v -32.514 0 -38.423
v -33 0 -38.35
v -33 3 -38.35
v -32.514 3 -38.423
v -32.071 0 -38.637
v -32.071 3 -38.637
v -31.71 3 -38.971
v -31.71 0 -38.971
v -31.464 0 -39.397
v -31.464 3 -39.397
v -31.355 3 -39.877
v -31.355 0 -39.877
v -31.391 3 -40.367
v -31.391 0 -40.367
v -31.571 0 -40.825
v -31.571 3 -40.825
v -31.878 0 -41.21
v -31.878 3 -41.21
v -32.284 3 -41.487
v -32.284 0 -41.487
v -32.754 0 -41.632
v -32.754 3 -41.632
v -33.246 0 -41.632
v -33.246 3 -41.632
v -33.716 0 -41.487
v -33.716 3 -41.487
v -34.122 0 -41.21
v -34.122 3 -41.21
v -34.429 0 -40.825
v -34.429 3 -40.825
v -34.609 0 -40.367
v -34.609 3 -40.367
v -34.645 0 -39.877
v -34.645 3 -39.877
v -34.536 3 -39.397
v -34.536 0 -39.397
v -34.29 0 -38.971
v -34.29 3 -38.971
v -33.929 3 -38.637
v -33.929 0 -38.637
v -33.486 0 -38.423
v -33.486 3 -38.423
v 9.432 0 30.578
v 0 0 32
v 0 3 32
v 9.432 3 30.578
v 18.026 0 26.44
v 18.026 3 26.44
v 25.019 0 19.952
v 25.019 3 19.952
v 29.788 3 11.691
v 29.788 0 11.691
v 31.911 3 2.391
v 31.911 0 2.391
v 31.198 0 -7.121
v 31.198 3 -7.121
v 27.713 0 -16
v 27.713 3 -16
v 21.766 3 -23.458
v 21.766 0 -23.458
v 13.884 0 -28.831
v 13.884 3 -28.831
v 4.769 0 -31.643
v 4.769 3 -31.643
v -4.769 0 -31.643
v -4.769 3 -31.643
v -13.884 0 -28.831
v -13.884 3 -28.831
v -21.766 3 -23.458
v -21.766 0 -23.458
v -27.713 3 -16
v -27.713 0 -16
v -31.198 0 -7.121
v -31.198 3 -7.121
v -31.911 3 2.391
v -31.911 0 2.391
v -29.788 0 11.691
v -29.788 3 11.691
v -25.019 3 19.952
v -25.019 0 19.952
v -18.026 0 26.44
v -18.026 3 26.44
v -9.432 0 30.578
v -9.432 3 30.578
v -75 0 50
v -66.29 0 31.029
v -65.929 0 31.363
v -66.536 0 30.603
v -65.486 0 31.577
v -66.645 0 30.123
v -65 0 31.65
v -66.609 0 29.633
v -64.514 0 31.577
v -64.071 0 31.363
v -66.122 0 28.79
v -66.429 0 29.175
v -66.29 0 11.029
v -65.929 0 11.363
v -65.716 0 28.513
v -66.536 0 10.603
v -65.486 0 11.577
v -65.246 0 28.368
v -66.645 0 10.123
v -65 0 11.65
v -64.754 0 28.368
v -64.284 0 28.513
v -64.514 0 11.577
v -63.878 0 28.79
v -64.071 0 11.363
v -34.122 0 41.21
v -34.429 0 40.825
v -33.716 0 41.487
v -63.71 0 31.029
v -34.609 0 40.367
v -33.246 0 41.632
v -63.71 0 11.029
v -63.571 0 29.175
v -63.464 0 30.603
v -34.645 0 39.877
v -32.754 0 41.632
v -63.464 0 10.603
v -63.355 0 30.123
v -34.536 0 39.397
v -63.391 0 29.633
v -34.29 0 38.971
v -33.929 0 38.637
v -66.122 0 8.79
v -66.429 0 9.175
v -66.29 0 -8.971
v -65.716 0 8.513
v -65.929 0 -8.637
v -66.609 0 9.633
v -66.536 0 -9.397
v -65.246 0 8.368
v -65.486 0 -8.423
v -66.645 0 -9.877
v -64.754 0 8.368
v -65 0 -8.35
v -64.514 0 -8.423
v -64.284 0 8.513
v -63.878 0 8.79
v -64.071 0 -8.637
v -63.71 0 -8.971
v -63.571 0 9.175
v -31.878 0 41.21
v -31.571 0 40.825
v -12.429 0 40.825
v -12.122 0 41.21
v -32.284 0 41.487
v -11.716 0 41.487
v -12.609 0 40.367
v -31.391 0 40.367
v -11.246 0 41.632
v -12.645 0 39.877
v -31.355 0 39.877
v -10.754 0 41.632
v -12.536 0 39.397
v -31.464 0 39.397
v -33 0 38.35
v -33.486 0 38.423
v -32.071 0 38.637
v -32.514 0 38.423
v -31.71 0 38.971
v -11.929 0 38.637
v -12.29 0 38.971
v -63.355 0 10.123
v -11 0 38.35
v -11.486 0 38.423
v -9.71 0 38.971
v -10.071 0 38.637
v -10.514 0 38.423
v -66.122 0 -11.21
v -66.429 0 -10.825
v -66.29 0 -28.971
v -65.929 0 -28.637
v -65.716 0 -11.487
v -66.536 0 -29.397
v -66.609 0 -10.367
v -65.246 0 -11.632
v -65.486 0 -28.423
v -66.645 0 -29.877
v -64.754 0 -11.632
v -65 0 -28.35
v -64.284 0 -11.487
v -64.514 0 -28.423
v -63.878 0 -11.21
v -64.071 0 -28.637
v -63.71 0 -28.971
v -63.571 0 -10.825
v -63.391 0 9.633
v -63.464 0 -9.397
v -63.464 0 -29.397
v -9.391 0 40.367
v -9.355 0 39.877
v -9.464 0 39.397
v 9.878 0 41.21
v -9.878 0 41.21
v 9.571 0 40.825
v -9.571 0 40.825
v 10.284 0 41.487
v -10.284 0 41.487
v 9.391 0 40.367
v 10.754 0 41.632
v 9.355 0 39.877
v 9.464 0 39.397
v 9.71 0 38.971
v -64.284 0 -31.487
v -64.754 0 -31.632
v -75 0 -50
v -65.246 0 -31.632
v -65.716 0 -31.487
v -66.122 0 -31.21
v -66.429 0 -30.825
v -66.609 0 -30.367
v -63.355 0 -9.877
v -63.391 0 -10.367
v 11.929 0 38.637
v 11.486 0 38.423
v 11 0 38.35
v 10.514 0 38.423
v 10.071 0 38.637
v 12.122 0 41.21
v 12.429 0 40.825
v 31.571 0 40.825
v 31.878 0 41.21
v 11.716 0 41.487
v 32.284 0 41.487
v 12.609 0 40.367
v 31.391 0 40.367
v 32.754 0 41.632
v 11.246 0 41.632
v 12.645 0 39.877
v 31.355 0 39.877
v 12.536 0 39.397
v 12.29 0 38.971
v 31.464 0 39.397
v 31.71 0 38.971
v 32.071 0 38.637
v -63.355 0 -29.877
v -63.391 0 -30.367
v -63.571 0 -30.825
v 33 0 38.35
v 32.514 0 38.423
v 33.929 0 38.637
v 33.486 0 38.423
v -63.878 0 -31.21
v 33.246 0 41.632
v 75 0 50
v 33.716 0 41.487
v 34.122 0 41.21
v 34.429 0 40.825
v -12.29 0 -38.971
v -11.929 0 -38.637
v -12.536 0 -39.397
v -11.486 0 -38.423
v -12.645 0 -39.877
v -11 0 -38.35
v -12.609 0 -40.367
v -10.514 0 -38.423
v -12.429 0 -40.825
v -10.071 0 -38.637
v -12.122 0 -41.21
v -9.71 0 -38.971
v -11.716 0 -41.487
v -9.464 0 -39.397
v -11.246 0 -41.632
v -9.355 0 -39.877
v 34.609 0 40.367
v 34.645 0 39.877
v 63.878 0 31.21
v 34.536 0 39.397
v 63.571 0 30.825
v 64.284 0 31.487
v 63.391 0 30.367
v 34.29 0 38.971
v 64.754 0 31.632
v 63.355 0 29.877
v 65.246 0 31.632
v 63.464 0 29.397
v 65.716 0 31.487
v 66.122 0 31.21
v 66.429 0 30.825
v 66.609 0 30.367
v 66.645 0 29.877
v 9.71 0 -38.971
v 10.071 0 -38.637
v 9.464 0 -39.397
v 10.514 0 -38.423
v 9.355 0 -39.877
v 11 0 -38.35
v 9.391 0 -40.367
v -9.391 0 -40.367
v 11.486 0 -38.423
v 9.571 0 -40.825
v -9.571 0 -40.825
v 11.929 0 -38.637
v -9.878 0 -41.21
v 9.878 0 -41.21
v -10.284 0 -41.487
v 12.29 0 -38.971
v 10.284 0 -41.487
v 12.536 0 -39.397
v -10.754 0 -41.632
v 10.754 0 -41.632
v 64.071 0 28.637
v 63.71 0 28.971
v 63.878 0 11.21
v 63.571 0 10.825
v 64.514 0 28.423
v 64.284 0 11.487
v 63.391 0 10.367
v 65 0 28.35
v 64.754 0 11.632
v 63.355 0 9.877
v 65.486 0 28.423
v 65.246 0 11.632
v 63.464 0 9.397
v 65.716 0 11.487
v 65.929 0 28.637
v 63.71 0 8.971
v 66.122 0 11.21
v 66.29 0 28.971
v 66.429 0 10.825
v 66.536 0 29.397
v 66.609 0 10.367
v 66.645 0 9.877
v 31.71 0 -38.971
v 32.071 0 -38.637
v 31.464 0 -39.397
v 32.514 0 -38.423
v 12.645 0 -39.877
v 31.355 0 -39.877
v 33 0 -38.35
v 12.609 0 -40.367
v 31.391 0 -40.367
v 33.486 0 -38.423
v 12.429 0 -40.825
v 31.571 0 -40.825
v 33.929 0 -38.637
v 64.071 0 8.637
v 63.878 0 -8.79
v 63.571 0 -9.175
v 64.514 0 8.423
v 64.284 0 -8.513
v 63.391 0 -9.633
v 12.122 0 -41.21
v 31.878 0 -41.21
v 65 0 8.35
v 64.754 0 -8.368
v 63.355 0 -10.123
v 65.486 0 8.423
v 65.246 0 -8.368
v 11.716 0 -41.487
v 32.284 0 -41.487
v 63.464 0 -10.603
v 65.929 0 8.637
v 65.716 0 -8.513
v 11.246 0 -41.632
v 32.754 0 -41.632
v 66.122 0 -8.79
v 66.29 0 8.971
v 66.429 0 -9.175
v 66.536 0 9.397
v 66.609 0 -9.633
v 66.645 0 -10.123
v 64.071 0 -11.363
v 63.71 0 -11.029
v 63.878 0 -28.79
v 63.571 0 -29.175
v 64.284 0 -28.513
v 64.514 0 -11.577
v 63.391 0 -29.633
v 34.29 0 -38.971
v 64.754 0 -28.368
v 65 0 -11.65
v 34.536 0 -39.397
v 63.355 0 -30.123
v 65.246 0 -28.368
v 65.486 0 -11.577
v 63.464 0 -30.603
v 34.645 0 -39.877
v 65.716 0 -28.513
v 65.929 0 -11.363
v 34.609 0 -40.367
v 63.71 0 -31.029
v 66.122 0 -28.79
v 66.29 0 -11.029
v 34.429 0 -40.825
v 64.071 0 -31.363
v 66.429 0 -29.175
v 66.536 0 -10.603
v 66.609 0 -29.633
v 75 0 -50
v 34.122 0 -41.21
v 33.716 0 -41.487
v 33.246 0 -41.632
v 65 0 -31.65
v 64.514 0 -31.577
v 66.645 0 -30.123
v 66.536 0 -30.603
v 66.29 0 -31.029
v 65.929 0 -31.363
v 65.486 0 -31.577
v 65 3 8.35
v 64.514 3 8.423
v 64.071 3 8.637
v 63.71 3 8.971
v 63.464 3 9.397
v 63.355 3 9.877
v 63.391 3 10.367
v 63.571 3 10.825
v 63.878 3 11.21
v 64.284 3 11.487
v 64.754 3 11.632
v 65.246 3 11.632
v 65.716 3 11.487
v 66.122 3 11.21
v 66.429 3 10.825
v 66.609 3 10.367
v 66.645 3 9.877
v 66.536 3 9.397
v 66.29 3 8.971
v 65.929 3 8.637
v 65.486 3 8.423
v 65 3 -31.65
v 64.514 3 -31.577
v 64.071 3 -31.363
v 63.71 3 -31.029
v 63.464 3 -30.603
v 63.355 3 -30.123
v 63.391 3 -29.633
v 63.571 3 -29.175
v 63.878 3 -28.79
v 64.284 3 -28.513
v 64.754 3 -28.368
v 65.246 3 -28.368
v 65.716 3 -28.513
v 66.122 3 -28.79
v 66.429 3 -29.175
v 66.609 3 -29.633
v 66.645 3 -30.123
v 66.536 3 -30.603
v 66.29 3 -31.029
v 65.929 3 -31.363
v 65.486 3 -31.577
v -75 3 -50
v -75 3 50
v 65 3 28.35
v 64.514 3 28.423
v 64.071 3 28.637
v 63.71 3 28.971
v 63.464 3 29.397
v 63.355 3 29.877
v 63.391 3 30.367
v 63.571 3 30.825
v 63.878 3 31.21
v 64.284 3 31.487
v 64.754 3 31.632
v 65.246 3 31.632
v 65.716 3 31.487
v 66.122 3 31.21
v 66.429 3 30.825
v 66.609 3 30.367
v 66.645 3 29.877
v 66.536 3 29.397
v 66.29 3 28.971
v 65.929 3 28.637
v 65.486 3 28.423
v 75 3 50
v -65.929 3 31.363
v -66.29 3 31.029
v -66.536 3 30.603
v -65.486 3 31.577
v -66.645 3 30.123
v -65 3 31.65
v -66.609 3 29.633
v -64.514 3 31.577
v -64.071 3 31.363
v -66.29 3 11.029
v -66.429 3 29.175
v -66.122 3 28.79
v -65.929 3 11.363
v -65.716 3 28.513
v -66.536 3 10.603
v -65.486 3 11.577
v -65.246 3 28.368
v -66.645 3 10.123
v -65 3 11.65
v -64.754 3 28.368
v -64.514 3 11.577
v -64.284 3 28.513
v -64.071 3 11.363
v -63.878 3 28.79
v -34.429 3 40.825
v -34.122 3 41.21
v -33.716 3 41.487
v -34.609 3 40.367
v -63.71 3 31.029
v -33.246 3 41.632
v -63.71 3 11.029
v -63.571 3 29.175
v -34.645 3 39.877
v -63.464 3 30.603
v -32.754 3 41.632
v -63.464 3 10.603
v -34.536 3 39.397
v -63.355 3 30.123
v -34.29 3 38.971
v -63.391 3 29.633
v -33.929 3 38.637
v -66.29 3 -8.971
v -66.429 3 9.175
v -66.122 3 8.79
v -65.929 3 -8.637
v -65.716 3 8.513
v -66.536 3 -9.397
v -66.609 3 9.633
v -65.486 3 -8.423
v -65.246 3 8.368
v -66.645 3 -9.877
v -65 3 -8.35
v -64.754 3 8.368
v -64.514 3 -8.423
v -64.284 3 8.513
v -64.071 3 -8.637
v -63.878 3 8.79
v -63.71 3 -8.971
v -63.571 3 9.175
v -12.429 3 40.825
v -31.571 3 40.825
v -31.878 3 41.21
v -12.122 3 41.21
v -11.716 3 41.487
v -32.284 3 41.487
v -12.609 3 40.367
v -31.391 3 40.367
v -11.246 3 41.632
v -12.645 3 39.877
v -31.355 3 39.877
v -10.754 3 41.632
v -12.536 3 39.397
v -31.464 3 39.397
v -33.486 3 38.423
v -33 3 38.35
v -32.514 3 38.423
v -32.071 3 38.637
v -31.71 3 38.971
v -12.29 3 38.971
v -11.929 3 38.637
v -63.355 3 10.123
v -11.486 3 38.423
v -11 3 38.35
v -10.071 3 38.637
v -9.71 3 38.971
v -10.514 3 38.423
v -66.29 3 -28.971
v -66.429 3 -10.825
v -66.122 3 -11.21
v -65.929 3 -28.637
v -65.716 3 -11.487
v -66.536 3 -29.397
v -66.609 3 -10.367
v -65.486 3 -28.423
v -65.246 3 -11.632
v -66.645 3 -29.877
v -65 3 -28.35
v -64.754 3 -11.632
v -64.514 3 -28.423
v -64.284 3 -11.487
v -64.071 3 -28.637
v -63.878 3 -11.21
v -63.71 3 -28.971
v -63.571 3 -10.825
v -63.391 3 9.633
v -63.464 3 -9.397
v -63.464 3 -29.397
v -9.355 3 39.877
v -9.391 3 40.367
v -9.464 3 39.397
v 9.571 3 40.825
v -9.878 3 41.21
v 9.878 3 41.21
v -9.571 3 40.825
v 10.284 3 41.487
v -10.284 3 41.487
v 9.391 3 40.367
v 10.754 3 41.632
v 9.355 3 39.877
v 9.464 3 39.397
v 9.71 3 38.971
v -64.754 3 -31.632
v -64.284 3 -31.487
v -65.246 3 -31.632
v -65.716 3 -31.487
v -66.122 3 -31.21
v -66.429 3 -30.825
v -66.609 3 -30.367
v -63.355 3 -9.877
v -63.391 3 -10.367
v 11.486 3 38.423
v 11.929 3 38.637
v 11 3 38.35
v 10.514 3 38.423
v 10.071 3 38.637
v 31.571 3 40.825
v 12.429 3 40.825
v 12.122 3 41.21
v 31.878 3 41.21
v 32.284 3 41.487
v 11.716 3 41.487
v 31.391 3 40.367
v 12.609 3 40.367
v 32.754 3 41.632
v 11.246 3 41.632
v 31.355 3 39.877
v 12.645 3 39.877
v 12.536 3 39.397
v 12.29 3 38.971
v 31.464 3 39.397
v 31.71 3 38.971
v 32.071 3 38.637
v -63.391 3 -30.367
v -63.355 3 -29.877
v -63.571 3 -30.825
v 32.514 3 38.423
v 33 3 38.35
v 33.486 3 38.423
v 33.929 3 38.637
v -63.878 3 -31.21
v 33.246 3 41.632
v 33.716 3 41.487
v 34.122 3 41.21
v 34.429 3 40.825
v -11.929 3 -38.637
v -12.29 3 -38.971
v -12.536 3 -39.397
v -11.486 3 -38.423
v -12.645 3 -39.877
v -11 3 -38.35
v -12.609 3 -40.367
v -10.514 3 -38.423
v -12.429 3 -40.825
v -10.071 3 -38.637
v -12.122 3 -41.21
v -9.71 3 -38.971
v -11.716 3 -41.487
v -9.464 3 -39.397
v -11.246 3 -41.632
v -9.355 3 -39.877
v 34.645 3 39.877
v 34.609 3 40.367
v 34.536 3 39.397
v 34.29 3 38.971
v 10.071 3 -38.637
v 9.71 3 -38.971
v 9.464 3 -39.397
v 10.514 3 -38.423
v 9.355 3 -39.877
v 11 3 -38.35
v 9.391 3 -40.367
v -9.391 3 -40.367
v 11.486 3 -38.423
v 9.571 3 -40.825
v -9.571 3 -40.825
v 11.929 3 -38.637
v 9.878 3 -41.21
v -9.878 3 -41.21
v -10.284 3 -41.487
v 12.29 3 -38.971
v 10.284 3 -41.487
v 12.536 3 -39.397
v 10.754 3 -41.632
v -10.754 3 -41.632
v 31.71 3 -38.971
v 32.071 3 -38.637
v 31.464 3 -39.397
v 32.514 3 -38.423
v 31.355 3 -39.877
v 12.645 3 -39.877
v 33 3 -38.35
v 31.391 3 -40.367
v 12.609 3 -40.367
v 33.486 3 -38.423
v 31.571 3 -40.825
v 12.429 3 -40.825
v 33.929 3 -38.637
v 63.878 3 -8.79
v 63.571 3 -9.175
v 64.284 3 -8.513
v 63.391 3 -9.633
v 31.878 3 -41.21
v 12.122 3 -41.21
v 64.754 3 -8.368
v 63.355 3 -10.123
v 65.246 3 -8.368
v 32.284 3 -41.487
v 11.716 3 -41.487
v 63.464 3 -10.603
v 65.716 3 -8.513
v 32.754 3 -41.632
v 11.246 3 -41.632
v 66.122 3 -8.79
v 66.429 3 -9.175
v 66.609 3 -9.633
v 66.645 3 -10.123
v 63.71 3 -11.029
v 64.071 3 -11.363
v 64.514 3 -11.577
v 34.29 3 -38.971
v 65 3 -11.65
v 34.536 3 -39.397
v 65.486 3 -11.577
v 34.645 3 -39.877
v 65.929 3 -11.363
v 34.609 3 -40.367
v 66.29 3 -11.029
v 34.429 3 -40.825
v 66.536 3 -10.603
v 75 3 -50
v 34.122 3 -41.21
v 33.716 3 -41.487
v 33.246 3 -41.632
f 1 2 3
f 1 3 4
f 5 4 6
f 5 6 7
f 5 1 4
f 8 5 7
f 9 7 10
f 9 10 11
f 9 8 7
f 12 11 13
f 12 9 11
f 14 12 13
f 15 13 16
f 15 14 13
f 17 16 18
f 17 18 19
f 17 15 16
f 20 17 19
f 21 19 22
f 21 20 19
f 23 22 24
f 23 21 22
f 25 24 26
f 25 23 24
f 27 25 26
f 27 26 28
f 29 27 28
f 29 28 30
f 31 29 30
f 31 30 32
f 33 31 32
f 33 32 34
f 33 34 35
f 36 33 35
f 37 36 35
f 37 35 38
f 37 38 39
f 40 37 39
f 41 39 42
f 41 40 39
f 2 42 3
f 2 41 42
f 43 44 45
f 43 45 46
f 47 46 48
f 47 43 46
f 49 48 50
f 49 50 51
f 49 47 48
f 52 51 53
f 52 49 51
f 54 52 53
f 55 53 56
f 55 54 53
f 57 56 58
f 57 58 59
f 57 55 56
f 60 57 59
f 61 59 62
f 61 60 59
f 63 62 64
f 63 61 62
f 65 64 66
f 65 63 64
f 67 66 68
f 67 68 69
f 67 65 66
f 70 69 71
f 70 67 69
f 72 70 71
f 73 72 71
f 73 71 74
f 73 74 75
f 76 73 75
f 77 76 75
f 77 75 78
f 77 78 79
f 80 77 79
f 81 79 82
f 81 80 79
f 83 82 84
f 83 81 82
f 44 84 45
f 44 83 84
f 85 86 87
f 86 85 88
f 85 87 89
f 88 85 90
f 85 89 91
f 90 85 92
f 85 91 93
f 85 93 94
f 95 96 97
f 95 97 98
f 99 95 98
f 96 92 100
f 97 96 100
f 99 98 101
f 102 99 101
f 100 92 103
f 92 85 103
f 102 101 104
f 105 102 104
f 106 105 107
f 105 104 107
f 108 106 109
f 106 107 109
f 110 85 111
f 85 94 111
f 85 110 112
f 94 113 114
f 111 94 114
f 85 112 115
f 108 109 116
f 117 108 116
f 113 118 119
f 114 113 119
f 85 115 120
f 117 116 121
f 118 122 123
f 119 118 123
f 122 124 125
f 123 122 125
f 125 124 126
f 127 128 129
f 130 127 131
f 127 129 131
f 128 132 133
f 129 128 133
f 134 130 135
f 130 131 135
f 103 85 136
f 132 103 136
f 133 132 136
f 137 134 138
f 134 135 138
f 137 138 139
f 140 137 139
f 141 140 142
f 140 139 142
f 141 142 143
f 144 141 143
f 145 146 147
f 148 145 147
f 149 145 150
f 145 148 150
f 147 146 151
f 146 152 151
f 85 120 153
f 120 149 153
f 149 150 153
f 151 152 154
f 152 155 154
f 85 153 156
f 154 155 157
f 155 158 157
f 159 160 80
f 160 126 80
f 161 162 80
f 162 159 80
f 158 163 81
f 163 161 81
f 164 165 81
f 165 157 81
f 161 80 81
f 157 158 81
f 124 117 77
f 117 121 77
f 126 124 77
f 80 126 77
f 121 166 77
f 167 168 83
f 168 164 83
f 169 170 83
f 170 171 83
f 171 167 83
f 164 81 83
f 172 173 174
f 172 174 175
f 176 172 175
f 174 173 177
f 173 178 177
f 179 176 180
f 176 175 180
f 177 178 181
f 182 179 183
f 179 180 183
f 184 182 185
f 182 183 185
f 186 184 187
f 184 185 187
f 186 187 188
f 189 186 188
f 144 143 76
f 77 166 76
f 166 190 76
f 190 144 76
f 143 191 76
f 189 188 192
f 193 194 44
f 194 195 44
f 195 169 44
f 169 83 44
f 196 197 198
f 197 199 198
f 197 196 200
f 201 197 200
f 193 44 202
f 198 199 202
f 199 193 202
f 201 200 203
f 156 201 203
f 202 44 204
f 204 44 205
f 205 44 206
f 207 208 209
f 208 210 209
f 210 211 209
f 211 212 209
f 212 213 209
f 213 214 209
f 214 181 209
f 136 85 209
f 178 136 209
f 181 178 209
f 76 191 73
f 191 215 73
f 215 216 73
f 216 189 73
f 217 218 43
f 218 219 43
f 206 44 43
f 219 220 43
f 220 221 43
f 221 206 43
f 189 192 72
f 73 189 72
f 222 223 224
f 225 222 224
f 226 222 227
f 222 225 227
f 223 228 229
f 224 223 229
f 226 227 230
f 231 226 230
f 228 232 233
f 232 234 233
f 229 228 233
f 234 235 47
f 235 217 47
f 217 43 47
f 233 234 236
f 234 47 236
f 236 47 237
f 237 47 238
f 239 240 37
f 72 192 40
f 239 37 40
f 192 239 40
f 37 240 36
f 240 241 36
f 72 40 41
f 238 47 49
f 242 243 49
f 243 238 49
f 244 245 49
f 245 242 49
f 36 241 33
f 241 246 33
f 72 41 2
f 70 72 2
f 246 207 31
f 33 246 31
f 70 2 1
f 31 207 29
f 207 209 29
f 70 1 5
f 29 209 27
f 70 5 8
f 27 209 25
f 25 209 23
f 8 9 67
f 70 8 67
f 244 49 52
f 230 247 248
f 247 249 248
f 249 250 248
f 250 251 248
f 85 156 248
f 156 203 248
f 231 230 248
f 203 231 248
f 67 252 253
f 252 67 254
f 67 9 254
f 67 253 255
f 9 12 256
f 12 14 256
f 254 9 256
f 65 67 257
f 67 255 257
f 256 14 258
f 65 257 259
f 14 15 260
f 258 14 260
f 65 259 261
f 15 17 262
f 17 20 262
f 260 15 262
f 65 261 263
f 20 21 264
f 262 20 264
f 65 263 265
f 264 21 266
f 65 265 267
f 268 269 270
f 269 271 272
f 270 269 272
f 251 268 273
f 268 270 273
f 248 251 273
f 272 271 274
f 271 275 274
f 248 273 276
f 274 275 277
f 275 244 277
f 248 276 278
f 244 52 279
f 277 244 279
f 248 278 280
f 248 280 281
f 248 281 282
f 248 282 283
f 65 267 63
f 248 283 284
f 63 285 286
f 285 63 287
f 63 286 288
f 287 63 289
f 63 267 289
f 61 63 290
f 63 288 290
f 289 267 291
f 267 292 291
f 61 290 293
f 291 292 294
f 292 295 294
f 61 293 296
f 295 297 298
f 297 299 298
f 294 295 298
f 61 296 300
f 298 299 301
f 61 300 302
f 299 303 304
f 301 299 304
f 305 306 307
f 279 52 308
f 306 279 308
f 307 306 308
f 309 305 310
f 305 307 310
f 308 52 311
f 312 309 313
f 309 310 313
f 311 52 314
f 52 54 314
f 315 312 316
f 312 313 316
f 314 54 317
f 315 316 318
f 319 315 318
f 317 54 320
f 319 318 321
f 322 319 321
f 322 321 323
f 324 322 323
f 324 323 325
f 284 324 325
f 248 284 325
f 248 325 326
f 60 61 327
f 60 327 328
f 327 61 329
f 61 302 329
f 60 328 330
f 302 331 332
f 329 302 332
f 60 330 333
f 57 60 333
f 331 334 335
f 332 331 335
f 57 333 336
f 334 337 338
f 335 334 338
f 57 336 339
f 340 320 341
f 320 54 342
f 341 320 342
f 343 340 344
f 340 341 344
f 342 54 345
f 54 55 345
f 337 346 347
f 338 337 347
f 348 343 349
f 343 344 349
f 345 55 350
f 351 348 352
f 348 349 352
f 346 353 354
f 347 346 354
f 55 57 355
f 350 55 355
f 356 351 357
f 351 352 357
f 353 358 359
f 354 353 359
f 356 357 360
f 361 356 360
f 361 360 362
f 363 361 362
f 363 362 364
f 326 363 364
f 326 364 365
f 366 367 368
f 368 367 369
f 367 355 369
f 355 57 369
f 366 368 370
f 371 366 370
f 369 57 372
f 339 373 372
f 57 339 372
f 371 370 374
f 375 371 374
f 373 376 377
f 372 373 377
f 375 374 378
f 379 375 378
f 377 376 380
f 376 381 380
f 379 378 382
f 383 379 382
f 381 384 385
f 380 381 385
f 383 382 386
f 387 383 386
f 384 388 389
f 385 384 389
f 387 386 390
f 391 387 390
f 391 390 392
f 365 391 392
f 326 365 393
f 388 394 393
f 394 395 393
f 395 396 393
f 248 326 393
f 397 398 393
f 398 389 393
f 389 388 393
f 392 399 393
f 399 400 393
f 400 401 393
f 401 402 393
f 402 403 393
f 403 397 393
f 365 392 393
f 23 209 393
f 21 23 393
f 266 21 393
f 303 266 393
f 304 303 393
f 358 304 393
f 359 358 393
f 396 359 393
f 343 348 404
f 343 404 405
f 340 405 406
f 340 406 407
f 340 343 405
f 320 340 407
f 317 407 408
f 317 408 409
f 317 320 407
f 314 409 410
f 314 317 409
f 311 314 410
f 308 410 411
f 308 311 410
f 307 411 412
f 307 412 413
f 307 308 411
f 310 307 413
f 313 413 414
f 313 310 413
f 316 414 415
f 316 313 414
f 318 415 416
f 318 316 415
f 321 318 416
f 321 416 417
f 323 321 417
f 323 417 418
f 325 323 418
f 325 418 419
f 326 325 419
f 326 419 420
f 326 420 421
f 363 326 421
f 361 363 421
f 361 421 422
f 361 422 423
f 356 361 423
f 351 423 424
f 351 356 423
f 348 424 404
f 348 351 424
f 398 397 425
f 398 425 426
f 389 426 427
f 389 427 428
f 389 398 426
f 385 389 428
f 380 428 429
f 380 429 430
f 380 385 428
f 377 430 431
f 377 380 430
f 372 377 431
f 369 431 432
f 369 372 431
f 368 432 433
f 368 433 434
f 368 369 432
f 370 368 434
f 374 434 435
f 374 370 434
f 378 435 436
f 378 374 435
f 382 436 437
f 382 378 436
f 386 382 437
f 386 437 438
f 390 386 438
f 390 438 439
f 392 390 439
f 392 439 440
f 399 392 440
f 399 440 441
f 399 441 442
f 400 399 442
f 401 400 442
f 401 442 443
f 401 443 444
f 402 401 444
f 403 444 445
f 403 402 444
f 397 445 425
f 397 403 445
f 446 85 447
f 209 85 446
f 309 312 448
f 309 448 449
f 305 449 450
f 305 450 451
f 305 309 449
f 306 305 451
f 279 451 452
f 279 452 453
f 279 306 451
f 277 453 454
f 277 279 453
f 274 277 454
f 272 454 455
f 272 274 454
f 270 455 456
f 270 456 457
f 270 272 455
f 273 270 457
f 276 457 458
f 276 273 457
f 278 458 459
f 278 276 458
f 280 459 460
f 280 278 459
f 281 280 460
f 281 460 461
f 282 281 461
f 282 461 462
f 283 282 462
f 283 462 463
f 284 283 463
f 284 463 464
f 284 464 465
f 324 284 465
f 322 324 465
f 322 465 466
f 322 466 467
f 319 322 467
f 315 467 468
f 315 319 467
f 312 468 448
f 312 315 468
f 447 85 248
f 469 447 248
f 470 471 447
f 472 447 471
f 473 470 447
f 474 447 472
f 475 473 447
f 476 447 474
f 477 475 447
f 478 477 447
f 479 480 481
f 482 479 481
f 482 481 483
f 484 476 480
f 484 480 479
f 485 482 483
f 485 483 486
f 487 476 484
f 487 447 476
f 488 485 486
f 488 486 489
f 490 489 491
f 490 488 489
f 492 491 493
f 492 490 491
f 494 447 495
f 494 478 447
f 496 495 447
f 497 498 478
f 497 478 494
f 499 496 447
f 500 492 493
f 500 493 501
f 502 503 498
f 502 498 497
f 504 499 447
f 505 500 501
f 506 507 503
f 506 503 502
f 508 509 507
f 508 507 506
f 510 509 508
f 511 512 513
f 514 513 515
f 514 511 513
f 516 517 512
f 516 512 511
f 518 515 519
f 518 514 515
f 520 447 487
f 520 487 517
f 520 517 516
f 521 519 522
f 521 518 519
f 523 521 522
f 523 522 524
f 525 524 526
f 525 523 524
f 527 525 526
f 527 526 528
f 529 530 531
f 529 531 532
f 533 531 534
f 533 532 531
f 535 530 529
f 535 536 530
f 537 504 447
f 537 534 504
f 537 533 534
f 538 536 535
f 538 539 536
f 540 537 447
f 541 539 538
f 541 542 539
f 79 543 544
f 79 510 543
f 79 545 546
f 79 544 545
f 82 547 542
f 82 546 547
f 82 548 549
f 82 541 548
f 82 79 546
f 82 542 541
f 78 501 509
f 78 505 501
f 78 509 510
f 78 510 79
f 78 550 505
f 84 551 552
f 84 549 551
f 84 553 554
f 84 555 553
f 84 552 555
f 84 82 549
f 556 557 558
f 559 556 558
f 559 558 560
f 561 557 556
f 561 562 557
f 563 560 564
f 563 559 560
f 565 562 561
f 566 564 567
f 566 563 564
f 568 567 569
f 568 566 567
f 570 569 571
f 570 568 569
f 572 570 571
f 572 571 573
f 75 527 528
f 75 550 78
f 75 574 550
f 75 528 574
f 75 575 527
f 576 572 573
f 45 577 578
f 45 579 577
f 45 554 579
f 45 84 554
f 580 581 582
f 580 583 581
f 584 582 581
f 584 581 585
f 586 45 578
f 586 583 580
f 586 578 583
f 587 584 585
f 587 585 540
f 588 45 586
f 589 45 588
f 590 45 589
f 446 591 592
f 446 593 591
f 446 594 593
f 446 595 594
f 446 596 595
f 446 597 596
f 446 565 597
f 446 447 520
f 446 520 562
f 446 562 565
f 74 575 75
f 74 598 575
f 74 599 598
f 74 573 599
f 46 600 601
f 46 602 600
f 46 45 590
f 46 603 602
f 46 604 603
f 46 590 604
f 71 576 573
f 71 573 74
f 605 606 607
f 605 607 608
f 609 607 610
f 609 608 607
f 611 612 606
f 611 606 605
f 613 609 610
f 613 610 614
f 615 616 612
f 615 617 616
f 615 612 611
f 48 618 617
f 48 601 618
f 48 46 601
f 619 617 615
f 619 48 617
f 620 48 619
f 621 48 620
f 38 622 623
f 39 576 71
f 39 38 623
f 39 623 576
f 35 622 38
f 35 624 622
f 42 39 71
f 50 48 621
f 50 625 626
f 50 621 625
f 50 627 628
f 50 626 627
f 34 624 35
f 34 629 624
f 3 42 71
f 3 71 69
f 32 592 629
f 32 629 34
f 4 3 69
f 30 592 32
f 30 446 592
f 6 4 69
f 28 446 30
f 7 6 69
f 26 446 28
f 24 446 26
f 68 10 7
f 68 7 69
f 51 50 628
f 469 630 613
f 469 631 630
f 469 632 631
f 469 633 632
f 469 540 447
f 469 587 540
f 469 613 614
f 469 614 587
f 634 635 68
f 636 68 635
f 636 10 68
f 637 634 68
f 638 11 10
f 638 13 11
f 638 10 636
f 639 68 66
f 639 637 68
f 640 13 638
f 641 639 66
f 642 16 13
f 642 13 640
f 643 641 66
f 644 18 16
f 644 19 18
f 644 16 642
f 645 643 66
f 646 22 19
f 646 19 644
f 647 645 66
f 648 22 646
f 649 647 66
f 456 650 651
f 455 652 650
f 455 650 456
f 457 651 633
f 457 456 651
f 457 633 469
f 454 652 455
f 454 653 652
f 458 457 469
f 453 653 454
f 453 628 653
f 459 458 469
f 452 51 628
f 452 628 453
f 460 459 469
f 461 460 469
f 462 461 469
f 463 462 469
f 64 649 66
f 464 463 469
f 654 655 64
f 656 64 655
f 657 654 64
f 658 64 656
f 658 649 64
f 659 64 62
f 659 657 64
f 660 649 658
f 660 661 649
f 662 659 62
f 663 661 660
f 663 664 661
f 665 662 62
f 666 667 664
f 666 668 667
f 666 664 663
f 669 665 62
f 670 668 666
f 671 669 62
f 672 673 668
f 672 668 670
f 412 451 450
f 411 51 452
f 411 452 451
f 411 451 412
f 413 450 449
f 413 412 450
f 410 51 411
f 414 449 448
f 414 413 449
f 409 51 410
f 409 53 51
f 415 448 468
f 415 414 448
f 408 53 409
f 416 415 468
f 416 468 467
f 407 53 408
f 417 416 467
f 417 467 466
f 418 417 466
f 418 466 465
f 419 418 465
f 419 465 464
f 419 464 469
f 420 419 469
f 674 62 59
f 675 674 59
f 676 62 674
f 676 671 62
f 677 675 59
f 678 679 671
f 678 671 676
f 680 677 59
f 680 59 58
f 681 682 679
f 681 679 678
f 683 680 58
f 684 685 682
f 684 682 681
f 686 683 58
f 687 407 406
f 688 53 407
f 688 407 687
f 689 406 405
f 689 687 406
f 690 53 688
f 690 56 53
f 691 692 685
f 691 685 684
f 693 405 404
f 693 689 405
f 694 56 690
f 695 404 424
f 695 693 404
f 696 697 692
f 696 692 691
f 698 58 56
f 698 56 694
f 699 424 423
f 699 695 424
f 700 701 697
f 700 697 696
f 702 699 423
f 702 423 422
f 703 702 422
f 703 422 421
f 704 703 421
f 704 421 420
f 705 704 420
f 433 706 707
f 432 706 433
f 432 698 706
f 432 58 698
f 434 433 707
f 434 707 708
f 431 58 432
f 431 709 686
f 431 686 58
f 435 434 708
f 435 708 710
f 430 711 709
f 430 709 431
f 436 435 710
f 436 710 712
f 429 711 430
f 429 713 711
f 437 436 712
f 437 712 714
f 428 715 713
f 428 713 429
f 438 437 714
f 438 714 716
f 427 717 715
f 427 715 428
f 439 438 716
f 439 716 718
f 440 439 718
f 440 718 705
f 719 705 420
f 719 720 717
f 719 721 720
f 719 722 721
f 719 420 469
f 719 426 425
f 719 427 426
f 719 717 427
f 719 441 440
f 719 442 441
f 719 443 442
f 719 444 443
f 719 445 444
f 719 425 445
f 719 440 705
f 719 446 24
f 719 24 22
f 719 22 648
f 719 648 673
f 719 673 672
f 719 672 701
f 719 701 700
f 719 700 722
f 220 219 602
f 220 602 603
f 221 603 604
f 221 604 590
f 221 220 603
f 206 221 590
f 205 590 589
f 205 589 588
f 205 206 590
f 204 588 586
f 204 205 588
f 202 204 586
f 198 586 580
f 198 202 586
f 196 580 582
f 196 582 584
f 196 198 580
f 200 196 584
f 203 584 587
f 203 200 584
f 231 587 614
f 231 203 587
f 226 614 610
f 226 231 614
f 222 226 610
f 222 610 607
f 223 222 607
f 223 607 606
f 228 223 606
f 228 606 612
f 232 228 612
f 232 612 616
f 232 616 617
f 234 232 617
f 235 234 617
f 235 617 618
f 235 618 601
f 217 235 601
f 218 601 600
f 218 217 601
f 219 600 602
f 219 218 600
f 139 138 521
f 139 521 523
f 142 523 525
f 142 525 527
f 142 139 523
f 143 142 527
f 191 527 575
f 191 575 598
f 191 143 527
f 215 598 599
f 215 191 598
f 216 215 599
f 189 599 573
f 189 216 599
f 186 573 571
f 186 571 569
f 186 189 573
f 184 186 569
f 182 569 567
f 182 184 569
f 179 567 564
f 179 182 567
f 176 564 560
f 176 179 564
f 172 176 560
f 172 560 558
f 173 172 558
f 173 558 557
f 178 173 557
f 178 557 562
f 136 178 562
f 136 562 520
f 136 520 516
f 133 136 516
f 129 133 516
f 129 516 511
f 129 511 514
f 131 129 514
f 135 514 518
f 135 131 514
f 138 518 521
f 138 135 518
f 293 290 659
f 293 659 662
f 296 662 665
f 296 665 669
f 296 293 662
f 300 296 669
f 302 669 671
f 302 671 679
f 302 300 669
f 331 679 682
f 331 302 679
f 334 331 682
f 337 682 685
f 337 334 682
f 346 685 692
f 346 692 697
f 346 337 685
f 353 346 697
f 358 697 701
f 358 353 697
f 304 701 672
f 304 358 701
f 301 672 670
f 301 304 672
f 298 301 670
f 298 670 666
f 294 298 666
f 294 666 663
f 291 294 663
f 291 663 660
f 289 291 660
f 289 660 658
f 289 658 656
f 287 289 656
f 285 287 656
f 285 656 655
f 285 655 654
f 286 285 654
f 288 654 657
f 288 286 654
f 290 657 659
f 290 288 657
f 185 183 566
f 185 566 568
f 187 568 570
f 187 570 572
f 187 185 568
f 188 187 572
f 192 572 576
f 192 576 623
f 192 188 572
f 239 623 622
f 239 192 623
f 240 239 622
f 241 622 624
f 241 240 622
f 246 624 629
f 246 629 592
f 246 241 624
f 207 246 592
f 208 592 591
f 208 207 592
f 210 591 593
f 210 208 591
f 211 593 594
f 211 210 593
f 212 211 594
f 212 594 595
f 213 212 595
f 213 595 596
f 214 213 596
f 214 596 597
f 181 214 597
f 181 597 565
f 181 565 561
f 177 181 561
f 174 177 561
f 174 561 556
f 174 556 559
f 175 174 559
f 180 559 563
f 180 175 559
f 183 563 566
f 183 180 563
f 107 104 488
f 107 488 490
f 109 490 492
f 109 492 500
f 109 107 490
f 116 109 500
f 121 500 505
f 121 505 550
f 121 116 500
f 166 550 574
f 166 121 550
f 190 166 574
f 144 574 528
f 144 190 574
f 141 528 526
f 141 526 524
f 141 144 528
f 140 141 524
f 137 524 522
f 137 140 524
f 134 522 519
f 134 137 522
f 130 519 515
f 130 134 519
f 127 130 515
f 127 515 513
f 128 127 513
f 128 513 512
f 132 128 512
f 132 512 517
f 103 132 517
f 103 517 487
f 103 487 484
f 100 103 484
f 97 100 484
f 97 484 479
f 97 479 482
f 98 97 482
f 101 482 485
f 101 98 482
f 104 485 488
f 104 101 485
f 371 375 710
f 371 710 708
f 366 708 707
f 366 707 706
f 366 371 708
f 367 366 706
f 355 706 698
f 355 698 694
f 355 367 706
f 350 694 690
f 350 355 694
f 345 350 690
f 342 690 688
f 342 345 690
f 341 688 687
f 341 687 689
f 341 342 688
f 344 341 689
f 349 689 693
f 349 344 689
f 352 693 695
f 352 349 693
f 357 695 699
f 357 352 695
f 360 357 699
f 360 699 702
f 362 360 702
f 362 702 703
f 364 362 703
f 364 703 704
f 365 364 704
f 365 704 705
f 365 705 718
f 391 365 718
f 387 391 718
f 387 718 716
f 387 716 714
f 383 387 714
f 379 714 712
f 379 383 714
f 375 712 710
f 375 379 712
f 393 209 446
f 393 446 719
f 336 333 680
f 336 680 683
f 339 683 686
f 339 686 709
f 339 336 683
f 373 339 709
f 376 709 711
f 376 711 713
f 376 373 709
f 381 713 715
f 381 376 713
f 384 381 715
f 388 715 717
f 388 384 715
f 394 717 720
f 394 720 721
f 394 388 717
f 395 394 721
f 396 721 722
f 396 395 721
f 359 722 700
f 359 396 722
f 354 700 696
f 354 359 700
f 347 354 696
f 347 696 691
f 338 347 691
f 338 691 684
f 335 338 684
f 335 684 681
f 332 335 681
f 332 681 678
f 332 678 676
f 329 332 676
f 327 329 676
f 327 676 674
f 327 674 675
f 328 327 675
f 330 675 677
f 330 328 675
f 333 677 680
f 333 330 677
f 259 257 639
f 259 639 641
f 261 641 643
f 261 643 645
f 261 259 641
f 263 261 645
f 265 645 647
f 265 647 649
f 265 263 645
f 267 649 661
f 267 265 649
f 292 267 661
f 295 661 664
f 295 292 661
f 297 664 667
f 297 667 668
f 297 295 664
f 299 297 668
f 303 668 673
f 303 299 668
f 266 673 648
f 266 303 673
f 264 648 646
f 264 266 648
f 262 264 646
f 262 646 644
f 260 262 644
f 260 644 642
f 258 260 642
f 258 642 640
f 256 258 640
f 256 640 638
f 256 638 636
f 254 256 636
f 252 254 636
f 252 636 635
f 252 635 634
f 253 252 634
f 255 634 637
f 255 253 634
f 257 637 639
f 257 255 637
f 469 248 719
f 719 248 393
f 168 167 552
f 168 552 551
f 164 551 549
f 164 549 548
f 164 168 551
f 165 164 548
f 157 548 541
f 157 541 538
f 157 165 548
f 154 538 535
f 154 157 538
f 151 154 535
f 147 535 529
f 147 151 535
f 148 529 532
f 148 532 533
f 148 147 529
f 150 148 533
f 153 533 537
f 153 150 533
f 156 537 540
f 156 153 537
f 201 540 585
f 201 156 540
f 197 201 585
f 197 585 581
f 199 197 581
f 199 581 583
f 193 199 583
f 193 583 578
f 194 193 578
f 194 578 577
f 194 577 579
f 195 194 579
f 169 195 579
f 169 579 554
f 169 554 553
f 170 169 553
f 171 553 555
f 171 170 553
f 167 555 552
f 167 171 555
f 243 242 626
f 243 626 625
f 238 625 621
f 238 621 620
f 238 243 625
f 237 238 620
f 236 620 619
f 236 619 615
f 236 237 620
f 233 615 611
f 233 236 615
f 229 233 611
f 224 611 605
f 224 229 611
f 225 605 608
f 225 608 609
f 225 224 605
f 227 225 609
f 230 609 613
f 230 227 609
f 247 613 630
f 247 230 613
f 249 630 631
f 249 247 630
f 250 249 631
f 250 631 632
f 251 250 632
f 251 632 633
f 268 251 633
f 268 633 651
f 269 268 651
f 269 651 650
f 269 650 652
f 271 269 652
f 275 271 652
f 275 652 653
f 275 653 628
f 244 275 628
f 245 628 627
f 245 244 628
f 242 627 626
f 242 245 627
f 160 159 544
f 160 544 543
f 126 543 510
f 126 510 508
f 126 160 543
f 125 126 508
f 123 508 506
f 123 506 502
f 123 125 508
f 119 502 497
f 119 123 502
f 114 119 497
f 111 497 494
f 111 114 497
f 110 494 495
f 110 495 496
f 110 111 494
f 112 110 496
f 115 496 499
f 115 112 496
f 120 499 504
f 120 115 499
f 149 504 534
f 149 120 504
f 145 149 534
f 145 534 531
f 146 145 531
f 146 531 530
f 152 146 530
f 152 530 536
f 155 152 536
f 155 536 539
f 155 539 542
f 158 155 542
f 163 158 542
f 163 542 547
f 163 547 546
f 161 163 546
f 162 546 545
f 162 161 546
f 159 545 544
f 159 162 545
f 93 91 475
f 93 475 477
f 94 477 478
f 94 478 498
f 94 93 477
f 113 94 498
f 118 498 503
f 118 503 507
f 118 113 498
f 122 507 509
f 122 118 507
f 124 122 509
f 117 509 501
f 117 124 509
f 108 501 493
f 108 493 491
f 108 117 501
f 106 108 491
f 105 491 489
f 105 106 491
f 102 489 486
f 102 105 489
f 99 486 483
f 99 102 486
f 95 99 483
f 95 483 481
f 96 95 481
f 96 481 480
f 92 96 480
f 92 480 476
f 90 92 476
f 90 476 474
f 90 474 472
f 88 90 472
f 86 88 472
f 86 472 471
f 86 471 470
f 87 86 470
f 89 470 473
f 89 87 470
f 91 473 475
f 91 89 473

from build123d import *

# Parameters (mm, degrees)
SKETCH_1_W      = 150
SKETCH_1_H      = 100
SKETCH_1_R      = 32
SKETCH_1_R_2    = 1.65
EXTRUDE_1_DEPTH = 3


with BuildPart() as part:
    # 草图1 → 凸台-拉伸1 (new body)
    with BuildSketch(Plane(origin=(0, 0, 0), x_dir=(1, 0, 0), z_dir=(0, 1, 0))):
        Rectangle(SKETCH_1_W, SKETCH_1_H)
        with Locations(Location((0, 0, 0), (0, 0, 270))):
            Circle(SKETCH_1_R, mode=Mode.SUBTRACT)
        with Locations(Location((-65, 30, 0), (0, 0, 270))):
            Circle(SKETCH_1_R_2, mode=Mode.SUBTRACT)
        with Locations(Location((-65, 10, 0), (0, 0, 270))):
            Circle(SKETCH_1_R_2, mode=Mode.SUBTRACT)
        with Locations(Location((-65, -10, 0), (0, 0, 270))):
            Circle(SKETCH_1_R_2, mode=Mode.SUBTRACT)
        with Locations(Location((-65, -30, 0), (0, 0, 270))):
            Circle(SKETCH_1_R_2, mode=Mode.SUBTRACT)
        with Locations(Location((65, -30, 0), (0, 0, 90))):
            Circle(SKETCH_1_R_2, mode=Mode.SUBTRACT)
        with Locations(Location((65, -10, 0), (0, 0, 90))):
            Circle(SKETCH_1_R_2, mode=Mode.SUBTRACT)
        with Locations(Location((65, 10, 0), (0, 0, 90))):
            Circle(SKETCH_1_R_2, mode=Mode.SUBTRACT)
        with Locations(Location((65, 30, 0), (0, 0, 90))):
            Circle(SKETCH_1_R_2, mode=Mode.SUBTRACT)
        with Locations(Location((33, 40, 0), (0, 0, 270))):
            Circle(SKETCH_1_R_2, mode=Mode.SUBTRACT)
        with Locations(Location((11, 40, 0), (0, 0, 270))):
            Circle(SKETCH_1_R_2, mode=Mode.SUBTRACT)
        with Locations(Location((-11, 40, 0), (0, 0, 270))):
            Circle(SKETCH_1_R_2, mode=Mode.SUBTRACT)
        with Locations(Location((-33, 40, 0), (0, 0, 270))):
            Circle(SKETCH_1_R_2, mode=Mode.SUBTRACT)
        with Locations(Location((33, -40, 0), (0, 0, 90))):
            Circle(SKETCH_1_R_2, mode=Mode.SUBTRACT)
        with Locations(Location((11, -40, 0), (0, 0, 90))):
            Circle(SKETCH_1_R_2, mode=Mode.SUBTRACT)
        with Locations(Location((-11, -40, 0), (0, 0, 90))):
            Circle(SKETCH_1_R_2, mode=Mode.SUBTRACT)
        with Locations(Location((-33, -40, 0), (0, 0, 90))):
            Circle(SKETCH_1_R_2, mode=Mode.SUBTRACT)
    extrude(amount=EXTRUDE_1_DEPTH)


solid = part.part
